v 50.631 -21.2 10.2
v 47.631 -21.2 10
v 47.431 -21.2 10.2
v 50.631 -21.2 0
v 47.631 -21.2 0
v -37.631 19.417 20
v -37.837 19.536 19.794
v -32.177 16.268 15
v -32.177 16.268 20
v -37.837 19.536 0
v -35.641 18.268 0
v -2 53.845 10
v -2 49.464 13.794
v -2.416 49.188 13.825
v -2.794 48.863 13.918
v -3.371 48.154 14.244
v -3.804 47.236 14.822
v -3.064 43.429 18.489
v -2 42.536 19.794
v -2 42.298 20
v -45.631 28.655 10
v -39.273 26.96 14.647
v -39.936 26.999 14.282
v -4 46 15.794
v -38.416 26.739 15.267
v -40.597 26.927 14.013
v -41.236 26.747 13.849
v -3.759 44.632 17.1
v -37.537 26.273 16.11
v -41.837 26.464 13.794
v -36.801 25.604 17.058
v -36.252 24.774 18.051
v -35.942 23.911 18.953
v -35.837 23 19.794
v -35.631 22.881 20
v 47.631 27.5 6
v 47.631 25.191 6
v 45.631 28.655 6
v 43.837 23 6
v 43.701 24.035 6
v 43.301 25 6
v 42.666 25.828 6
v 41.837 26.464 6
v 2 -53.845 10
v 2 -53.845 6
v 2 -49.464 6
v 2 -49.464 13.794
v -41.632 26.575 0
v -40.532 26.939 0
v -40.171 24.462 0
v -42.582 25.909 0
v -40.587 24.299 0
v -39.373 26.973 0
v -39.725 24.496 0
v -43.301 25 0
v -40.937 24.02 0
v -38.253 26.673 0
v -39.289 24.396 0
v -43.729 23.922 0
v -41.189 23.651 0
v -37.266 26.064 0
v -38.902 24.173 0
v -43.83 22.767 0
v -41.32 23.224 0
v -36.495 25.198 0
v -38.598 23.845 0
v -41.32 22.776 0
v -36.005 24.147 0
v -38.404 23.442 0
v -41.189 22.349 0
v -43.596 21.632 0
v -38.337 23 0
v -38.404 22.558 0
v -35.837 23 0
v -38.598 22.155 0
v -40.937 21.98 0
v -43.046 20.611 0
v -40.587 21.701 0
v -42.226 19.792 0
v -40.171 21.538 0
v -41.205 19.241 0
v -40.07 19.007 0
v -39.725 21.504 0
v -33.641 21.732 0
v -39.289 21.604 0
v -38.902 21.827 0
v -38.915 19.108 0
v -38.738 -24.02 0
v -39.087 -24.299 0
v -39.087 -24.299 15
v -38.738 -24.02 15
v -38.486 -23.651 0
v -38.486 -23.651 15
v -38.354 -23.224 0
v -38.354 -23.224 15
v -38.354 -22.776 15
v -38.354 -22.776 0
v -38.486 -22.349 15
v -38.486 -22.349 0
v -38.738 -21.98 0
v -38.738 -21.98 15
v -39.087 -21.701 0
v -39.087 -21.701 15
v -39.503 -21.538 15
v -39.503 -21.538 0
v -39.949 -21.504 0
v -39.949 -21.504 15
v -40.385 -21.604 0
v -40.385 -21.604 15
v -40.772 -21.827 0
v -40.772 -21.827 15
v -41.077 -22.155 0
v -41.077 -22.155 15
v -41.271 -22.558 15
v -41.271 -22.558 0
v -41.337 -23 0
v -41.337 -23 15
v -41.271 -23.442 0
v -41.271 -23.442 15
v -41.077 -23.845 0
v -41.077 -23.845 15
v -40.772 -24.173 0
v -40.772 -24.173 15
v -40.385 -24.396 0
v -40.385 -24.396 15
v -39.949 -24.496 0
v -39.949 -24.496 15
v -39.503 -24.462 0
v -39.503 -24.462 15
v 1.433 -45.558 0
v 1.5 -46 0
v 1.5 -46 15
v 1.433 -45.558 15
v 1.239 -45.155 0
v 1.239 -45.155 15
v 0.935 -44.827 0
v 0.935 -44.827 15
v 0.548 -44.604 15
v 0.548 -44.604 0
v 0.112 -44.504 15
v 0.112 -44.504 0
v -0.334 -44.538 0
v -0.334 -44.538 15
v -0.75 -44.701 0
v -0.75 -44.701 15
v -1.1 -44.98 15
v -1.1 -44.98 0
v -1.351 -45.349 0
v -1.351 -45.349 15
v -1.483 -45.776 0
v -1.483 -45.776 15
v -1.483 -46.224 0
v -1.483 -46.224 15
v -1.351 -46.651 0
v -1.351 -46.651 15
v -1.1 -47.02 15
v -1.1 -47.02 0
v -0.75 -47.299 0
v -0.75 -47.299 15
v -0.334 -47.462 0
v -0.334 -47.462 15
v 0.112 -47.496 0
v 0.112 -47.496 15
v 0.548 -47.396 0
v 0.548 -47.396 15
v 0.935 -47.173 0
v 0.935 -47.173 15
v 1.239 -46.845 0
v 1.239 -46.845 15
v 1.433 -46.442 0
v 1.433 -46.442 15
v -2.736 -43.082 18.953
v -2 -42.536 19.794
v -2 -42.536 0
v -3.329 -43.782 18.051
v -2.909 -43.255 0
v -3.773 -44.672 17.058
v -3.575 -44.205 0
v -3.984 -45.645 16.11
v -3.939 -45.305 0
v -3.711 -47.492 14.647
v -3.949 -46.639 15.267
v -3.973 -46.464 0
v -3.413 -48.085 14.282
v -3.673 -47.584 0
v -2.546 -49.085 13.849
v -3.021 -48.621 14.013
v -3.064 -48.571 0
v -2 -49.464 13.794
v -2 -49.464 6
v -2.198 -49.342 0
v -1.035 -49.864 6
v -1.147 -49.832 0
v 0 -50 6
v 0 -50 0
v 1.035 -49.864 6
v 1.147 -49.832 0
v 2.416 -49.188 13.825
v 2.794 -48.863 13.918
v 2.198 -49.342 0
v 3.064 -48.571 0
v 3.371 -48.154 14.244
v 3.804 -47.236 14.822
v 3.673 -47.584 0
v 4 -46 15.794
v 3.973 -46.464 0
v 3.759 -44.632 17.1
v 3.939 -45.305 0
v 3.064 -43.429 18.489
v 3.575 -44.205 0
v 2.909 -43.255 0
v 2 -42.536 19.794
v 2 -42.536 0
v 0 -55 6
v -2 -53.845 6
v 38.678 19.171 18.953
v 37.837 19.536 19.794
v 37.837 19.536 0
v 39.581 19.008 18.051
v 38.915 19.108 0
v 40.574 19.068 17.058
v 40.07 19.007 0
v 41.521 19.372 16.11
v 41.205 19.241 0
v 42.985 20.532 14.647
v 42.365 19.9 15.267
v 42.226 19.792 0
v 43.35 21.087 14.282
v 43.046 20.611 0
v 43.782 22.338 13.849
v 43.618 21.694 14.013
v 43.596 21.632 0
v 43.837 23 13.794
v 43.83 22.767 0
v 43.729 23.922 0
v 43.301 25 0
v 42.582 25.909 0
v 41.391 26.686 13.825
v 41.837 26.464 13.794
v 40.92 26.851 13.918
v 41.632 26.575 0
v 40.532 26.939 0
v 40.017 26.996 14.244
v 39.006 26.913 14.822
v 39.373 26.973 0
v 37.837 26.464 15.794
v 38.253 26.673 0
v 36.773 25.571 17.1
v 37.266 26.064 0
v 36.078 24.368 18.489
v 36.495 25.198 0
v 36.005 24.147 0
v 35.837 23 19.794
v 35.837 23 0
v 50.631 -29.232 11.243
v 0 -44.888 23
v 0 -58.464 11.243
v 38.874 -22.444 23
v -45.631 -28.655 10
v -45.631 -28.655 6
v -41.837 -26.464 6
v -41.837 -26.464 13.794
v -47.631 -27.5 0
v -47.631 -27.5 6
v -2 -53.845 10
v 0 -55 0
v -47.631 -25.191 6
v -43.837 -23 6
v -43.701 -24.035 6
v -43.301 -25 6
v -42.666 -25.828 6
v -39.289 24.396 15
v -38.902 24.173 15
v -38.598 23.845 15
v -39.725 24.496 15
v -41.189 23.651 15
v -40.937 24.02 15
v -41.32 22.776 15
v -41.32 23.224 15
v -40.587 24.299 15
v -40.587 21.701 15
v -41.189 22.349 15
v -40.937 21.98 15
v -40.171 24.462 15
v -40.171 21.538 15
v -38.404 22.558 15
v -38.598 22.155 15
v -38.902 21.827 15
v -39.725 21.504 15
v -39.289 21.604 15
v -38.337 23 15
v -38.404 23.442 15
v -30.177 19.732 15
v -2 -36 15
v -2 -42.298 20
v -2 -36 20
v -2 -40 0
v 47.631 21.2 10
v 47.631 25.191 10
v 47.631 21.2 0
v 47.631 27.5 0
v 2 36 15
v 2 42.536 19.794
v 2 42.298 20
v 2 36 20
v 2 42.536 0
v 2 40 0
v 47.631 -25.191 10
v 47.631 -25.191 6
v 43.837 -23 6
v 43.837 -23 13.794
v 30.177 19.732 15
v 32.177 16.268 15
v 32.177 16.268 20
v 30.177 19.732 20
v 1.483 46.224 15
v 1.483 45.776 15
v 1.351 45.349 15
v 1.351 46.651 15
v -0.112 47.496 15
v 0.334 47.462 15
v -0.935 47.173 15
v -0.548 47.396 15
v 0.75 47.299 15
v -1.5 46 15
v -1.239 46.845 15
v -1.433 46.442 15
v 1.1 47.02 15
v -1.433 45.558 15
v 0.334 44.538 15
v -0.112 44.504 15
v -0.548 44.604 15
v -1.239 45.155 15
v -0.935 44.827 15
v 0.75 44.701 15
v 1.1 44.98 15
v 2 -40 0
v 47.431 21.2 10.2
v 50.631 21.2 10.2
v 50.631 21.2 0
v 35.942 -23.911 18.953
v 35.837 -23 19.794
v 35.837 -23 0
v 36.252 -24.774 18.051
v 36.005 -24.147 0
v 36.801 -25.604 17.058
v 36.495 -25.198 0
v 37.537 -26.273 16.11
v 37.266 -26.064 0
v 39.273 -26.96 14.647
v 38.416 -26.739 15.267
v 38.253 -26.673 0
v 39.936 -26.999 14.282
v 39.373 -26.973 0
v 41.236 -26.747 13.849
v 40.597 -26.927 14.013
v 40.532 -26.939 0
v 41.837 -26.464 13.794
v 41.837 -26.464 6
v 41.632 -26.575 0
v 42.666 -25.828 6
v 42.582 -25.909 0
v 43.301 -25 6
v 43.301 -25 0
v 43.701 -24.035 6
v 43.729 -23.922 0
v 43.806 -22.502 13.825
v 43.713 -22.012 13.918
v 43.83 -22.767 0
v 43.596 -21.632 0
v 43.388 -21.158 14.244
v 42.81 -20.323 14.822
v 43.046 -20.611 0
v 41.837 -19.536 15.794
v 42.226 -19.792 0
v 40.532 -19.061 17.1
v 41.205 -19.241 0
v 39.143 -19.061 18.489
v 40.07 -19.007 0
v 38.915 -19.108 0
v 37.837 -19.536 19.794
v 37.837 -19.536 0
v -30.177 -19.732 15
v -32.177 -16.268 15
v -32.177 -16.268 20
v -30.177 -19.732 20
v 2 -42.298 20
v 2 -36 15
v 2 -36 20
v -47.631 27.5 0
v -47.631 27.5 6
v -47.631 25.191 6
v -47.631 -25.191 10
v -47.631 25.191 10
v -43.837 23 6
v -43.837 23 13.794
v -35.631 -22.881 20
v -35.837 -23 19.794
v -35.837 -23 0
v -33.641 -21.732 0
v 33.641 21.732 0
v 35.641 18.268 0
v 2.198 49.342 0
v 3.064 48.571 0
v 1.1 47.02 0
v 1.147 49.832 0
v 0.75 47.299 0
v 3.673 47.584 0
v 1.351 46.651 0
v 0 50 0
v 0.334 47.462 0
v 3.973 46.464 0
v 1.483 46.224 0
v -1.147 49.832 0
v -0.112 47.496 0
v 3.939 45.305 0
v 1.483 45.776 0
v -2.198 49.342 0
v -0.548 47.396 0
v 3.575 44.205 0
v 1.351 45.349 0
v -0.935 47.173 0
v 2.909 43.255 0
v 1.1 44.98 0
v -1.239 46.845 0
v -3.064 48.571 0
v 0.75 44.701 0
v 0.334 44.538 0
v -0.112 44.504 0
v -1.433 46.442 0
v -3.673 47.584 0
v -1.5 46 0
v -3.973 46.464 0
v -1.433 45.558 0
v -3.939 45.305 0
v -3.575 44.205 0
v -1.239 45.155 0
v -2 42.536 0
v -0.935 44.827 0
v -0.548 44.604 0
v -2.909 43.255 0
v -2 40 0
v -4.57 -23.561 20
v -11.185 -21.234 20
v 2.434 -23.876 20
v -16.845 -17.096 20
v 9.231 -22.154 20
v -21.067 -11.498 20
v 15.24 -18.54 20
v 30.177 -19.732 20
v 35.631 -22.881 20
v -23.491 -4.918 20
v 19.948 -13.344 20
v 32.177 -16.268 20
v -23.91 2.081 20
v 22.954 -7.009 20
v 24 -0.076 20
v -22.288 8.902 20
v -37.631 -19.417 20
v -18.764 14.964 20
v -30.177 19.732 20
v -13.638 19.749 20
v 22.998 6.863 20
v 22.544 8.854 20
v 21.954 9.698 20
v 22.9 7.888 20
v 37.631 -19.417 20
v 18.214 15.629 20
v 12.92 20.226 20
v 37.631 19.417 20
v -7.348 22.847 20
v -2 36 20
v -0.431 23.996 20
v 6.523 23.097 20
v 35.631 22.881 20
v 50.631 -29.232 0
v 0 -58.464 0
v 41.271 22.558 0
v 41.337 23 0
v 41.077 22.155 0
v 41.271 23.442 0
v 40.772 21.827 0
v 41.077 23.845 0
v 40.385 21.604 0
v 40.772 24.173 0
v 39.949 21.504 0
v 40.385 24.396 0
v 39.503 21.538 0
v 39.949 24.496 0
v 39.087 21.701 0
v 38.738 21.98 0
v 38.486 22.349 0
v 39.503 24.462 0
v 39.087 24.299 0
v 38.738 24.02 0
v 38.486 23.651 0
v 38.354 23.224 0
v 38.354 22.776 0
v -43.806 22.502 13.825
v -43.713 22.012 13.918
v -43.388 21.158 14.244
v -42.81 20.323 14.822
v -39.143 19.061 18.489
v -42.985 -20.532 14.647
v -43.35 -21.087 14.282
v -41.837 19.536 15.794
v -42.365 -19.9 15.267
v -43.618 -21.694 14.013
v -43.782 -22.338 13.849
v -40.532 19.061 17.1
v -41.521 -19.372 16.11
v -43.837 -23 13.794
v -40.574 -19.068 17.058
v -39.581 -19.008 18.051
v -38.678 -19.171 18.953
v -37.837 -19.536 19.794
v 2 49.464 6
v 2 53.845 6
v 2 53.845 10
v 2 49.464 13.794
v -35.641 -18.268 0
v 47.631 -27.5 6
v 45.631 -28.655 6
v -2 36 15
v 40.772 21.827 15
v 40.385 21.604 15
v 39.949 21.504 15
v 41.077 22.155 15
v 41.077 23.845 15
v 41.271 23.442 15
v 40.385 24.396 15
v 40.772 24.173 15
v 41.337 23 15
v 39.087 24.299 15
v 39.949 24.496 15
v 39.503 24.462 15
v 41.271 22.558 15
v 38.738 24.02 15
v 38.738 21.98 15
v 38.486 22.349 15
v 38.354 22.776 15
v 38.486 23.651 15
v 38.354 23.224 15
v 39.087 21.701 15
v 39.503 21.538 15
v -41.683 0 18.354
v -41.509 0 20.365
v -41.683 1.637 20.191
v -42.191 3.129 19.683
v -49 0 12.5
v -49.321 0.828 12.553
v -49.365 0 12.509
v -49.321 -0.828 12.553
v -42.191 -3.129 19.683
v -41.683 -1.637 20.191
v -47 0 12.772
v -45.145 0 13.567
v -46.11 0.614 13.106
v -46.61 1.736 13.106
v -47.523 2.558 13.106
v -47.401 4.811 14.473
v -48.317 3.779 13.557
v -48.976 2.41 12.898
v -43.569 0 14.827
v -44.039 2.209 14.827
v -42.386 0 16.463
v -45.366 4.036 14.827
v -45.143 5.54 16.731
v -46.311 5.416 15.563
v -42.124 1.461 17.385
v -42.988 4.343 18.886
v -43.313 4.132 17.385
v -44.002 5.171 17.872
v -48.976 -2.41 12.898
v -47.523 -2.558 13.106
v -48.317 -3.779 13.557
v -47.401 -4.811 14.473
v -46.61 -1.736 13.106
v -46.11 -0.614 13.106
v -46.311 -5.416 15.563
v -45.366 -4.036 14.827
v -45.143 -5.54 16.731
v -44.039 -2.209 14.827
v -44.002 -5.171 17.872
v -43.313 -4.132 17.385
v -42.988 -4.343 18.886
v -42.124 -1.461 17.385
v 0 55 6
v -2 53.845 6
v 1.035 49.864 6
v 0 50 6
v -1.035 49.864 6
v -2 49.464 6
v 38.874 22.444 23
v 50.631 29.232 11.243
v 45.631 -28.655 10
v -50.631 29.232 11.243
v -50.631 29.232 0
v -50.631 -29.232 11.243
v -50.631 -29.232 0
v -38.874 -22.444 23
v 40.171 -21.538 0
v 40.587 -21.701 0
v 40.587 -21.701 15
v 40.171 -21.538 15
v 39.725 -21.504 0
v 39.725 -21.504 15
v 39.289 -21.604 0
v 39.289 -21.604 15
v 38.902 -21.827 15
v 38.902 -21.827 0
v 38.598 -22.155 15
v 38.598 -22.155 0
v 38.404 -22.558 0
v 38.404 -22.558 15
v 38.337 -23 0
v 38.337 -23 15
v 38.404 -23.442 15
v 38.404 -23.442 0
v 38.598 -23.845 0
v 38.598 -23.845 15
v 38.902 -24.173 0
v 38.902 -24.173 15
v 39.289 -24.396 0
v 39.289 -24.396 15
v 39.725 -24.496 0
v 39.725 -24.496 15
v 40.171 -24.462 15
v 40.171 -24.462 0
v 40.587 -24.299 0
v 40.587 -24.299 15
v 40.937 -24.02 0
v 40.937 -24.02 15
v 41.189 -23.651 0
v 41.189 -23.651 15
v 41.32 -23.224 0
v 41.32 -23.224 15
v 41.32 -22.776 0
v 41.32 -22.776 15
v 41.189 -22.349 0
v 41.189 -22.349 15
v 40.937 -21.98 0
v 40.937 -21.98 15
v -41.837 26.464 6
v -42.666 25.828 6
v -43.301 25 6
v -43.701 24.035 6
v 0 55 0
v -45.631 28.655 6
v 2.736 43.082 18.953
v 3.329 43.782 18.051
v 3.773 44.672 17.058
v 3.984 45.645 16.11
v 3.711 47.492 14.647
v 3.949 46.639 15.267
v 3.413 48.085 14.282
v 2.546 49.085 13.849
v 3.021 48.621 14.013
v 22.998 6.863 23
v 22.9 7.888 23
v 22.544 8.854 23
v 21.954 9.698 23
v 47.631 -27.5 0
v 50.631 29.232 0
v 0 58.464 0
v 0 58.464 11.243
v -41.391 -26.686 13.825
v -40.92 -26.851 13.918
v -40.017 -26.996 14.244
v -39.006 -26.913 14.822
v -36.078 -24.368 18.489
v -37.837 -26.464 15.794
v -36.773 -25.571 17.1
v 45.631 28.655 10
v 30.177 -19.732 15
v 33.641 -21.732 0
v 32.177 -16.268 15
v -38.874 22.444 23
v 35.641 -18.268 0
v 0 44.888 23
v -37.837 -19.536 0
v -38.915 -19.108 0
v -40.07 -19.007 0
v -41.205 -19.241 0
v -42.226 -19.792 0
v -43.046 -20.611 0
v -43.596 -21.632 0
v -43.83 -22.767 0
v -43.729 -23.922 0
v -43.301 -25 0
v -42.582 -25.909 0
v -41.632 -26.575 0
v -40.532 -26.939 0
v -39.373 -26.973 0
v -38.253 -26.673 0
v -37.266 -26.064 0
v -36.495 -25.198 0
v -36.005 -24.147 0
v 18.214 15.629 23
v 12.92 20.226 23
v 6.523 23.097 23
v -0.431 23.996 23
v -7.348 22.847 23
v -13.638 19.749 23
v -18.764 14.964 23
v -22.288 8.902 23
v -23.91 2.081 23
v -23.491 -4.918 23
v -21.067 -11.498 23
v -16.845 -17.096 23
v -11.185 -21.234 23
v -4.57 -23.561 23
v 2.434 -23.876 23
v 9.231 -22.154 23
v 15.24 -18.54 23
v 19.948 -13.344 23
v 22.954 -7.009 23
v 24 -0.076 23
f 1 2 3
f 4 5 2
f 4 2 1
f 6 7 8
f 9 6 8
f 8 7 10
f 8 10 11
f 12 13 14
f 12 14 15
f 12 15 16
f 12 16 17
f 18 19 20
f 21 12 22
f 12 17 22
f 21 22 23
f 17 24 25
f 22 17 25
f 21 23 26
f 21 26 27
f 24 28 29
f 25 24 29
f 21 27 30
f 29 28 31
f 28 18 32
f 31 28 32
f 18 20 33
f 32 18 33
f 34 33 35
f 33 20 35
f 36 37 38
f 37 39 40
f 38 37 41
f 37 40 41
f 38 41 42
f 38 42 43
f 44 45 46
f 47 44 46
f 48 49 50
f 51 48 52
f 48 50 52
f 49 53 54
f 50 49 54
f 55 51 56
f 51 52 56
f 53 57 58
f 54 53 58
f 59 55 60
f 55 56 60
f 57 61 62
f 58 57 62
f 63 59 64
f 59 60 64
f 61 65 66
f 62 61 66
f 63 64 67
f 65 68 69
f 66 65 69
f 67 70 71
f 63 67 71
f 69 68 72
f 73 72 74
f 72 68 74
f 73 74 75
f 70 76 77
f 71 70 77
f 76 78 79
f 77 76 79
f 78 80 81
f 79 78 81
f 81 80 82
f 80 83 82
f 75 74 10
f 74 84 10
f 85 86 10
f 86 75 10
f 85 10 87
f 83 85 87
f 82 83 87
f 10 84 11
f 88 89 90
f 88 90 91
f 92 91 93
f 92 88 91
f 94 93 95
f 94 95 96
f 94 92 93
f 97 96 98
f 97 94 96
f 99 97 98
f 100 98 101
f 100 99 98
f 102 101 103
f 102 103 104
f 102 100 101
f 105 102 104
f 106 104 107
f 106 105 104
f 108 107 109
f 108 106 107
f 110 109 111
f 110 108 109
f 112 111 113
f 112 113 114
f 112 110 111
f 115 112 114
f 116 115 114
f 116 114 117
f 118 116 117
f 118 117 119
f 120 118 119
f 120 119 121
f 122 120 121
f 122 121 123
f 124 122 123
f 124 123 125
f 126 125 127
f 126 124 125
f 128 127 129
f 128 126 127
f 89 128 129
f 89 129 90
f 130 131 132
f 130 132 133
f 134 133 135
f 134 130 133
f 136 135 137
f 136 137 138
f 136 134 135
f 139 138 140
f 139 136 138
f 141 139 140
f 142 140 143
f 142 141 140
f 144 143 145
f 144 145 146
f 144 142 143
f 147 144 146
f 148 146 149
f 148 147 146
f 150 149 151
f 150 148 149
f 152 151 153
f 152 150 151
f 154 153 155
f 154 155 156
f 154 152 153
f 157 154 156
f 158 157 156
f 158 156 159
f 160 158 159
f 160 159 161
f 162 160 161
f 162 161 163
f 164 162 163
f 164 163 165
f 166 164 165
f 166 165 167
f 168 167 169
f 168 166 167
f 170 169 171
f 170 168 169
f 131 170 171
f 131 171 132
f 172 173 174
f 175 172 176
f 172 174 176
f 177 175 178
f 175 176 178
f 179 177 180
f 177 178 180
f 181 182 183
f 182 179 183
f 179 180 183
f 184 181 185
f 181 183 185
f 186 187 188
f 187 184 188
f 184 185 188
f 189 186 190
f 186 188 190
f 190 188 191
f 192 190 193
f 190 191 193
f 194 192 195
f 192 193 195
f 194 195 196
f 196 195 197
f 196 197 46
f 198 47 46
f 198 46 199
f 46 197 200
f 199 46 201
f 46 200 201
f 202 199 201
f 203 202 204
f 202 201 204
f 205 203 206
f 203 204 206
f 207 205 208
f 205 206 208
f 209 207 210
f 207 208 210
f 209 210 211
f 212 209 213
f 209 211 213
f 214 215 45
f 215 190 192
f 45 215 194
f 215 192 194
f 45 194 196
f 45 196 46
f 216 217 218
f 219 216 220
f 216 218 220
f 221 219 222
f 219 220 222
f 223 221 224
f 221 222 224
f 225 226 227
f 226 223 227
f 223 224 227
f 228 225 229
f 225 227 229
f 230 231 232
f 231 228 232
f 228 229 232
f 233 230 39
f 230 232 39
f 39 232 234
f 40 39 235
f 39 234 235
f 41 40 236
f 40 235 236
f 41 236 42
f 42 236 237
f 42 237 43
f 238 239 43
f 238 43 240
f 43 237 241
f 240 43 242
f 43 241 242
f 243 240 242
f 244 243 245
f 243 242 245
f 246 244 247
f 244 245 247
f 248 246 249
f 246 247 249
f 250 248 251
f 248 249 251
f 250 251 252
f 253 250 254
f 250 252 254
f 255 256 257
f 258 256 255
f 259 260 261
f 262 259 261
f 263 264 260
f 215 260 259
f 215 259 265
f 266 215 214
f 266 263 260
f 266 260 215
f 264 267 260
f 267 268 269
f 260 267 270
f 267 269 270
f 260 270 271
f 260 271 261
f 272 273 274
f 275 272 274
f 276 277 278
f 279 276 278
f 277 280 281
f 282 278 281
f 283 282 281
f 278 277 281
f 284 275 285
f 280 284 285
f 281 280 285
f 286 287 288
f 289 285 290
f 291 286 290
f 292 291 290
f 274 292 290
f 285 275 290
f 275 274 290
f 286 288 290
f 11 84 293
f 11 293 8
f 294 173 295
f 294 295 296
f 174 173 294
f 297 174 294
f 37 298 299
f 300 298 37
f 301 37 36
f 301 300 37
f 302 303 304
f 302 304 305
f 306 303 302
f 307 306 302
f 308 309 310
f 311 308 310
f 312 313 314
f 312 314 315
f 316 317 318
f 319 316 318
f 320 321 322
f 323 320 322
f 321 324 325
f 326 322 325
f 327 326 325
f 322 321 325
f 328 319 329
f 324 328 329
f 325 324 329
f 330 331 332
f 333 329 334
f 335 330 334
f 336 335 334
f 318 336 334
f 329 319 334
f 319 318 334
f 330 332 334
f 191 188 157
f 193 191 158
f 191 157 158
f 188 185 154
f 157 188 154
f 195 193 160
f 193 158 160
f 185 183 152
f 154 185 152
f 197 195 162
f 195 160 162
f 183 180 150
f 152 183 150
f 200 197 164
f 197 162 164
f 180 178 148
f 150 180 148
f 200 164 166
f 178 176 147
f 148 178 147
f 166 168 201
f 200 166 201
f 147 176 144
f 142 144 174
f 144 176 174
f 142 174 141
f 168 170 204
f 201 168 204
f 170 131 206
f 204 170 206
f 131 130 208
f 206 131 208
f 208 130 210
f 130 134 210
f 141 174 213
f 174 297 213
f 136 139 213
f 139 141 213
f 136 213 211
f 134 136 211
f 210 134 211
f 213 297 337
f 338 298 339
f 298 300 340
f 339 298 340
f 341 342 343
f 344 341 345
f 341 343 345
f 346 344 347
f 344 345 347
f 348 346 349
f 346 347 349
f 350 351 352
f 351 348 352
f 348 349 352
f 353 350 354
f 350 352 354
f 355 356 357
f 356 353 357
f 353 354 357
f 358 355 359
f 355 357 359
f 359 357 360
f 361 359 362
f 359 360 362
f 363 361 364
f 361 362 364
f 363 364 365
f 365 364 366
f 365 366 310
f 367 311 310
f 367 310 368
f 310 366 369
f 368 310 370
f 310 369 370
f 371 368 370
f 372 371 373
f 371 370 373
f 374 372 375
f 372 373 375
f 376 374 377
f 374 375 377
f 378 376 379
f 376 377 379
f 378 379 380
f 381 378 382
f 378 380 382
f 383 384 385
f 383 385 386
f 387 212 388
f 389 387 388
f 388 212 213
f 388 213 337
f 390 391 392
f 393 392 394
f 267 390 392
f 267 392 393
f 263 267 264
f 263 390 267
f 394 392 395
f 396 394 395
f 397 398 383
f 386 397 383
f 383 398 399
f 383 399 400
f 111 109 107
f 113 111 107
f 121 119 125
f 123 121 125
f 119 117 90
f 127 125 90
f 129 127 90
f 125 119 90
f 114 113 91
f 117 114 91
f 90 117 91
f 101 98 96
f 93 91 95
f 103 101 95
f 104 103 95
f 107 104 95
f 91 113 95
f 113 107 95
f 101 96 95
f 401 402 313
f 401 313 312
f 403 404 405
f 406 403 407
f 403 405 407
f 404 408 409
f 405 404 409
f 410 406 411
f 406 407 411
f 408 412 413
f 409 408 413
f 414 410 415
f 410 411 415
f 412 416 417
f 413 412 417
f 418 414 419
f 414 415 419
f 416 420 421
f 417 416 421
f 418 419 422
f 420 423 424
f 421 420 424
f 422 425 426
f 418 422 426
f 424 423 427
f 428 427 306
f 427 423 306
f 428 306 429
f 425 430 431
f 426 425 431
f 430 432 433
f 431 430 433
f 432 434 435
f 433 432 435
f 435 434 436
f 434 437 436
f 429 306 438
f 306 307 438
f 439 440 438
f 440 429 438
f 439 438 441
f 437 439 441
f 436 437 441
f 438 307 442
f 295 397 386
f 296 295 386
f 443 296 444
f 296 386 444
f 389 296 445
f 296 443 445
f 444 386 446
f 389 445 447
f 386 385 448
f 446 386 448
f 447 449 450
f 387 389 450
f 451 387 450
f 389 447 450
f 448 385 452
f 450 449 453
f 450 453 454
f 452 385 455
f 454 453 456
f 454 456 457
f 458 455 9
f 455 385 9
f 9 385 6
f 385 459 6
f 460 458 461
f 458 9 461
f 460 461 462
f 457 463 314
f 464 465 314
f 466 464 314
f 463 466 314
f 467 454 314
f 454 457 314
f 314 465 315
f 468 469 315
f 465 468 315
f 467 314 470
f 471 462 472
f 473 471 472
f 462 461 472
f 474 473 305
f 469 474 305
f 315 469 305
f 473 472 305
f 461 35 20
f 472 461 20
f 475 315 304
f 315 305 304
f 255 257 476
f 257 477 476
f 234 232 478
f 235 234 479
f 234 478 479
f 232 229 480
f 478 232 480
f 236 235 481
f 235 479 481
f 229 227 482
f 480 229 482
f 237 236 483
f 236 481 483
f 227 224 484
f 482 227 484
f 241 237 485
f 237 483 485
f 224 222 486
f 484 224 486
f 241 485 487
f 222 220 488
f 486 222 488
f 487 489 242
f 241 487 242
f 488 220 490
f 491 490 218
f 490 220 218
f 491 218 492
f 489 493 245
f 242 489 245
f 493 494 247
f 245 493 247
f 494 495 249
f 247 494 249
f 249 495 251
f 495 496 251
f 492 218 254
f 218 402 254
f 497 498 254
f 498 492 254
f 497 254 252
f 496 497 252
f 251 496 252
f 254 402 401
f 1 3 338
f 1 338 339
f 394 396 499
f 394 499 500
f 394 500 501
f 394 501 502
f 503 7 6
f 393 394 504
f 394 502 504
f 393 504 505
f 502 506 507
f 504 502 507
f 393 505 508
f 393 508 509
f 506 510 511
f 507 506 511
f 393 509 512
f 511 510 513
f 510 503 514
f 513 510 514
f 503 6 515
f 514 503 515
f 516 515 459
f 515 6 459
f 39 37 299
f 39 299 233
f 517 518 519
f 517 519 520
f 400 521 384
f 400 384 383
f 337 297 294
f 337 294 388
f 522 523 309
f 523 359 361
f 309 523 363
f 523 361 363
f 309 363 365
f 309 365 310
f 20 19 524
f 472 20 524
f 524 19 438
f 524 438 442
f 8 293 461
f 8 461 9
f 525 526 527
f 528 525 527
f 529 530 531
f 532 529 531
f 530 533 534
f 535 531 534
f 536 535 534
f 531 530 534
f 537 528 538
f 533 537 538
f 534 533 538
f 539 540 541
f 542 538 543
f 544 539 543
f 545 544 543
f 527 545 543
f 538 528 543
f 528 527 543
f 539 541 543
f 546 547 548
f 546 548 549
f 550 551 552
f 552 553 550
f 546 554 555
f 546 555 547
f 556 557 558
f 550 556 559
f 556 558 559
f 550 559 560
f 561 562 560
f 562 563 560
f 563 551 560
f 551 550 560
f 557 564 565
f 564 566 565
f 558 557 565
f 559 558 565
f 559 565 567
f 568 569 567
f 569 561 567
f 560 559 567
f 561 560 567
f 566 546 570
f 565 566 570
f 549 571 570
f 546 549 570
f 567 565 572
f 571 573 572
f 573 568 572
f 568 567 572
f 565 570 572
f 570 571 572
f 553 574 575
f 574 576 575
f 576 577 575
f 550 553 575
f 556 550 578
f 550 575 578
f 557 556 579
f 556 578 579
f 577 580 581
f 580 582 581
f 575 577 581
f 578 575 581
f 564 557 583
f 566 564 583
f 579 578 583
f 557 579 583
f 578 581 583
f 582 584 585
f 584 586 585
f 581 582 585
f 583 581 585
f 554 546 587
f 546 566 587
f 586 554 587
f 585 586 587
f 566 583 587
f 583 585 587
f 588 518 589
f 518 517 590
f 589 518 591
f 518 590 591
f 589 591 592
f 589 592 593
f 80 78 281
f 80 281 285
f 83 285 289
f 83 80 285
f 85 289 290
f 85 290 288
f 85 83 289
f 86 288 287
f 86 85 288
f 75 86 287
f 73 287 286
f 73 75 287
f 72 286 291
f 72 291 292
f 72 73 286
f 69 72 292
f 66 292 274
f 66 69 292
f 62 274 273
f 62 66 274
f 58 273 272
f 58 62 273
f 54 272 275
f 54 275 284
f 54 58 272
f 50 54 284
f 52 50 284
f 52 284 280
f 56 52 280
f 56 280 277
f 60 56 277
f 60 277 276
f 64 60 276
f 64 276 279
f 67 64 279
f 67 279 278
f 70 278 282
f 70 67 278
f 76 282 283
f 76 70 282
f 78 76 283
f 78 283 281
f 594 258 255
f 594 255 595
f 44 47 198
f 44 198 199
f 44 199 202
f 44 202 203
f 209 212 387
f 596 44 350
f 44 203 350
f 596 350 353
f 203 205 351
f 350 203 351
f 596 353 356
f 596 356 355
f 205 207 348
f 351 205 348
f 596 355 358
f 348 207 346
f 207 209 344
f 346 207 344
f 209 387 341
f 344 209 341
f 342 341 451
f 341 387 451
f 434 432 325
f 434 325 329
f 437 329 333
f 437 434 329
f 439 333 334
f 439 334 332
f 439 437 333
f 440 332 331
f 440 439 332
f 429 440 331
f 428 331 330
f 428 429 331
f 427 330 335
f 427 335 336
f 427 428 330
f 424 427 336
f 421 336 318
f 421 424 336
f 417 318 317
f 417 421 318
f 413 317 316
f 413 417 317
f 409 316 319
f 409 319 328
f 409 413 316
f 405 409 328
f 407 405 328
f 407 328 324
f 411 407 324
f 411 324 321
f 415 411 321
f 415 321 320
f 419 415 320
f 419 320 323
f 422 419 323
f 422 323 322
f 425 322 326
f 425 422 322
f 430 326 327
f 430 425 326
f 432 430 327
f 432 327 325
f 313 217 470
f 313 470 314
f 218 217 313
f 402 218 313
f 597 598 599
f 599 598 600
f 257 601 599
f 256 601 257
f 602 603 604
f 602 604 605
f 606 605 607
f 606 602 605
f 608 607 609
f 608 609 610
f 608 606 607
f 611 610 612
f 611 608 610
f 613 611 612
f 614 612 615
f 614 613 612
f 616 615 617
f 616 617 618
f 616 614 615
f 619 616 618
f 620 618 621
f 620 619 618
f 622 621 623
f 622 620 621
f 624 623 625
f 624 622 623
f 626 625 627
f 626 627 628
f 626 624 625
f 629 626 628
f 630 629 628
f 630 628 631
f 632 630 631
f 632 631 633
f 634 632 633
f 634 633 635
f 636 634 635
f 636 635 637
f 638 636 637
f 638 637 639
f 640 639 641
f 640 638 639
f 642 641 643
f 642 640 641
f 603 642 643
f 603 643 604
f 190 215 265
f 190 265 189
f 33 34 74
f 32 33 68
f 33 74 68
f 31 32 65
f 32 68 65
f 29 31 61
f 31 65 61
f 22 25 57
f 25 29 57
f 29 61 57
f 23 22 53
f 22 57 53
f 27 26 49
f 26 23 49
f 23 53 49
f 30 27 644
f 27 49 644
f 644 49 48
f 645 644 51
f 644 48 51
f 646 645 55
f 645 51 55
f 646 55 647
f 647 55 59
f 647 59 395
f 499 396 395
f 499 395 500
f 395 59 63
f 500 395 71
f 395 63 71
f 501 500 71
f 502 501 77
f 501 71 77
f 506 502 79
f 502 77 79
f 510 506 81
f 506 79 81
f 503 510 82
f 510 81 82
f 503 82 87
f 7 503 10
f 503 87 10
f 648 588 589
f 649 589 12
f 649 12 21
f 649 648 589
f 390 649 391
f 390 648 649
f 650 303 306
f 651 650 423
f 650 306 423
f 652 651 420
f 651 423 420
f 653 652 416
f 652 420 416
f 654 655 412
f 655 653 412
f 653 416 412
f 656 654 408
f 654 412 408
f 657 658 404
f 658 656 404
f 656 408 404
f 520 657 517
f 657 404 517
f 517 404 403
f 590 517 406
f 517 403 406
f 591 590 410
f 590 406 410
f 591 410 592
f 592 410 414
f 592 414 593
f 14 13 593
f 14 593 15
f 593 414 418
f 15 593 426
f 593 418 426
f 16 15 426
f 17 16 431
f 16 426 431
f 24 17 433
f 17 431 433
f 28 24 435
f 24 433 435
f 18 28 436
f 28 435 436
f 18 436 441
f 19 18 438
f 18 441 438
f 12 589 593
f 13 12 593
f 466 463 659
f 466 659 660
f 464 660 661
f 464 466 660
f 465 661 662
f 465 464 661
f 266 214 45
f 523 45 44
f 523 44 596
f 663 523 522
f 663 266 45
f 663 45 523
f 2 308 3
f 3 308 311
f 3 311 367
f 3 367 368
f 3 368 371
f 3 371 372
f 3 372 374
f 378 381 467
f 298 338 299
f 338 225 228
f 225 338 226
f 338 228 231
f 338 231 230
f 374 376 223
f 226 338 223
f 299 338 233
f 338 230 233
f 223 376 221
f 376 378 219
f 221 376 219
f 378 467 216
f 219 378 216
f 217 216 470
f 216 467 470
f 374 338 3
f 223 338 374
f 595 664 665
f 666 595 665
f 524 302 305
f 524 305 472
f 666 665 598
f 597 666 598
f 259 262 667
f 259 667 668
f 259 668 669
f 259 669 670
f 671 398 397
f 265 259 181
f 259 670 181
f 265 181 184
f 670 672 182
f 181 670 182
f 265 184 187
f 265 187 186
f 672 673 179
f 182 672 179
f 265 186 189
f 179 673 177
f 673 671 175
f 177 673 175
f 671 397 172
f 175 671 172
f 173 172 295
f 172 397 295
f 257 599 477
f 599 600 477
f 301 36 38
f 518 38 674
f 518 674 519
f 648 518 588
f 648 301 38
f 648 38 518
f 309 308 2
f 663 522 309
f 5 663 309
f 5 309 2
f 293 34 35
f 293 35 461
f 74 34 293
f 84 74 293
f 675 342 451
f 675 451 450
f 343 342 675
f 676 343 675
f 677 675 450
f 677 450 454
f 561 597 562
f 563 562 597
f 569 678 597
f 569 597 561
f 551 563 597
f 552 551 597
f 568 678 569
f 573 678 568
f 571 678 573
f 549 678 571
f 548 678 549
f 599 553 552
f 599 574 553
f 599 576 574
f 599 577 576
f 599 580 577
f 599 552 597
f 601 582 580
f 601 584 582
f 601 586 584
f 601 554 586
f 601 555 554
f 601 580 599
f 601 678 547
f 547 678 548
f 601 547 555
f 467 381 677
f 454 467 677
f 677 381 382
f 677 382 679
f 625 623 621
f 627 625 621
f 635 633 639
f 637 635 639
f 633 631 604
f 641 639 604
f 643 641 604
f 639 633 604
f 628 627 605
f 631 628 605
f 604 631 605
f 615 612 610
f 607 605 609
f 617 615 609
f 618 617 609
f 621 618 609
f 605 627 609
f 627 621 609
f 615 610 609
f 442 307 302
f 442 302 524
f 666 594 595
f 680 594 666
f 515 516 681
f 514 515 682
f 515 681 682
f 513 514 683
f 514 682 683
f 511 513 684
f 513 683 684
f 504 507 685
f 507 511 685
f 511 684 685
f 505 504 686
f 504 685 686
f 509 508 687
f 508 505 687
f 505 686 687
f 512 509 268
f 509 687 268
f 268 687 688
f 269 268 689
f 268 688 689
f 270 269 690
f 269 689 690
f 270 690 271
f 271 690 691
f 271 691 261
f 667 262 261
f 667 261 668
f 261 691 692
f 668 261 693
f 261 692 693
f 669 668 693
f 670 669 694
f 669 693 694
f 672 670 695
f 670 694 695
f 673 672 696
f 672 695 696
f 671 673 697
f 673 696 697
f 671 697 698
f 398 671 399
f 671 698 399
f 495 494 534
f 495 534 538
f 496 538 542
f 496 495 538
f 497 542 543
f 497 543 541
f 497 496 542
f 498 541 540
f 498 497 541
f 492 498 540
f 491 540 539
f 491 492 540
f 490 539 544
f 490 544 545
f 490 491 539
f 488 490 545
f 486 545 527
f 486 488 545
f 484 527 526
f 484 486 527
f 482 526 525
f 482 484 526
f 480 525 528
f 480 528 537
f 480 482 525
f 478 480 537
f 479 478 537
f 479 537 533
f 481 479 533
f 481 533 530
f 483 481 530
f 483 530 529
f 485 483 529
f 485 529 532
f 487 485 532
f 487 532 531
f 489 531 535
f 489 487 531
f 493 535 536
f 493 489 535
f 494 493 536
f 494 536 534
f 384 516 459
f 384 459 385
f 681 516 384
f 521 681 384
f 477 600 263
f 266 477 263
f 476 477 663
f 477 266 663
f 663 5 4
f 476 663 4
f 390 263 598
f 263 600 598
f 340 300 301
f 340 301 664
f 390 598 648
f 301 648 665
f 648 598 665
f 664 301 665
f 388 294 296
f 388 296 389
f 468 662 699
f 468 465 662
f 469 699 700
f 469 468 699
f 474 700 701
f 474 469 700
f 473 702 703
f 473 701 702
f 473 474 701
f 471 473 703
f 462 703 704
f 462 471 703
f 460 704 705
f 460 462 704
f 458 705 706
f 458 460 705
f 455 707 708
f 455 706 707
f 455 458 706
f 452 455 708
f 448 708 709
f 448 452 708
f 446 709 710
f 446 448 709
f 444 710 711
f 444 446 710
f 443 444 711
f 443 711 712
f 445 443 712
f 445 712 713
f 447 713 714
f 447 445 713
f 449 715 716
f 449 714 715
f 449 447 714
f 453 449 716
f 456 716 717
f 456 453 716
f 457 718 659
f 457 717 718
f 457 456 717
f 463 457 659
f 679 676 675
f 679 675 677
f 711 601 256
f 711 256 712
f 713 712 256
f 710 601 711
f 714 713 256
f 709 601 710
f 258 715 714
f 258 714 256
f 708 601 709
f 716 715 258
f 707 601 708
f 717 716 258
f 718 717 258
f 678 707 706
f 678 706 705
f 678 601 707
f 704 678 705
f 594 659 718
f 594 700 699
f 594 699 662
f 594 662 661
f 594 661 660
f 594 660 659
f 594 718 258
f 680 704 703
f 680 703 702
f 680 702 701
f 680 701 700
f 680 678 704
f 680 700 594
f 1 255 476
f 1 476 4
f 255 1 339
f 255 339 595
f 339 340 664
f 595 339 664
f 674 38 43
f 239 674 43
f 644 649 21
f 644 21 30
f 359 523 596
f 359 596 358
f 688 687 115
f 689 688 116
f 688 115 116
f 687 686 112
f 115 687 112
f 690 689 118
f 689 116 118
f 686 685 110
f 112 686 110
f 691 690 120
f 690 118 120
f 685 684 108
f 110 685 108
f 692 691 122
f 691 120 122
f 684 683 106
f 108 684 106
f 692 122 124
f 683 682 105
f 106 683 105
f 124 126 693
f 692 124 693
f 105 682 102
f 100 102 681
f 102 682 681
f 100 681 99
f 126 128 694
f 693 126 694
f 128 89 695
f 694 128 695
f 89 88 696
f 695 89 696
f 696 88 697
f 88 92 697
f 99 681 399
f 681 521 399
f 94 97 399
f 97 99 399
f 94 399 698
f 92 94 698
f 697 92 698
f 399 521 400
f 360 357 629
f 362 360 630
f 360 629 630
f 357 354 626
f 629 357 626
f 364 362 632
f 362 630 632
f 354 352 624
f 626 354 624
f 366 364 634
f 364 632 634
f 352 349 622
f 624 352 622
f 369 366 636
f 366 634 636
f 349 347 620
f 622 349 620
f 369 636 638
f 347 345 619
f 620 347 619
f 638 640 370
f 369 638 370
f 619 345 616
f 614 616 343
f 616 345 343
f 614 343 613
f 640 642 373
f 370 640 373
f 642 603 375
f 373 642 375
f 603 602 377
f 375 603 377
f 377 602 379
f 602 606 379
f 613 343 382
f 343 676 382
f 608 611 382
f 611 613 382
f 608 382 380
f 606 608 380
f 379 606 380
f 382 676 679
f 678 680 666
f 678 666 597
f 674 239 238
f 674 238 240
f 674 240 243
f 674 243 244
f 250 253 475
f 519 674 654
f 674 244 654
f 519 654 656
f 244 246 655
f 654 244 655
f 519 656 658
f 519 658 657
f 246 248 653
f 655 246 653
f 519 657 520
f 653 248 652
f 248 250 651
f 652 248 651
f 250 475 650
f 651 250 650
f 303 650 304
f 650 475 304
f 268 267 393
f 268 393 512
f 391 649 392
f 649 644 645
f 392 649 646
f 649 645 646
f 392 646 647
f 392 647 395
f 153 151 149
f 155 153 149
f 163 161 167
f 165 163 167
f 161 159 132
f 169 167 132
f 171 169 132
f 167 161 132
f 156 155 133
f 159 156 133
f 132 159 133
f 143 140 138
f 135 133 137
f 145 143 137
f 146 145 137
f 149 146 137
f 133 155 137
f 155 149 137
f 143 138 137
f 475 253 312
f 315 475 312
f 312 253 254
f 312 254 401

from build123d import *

# Parameters (mm, degrees)
BOX038_W                 = 6
BOX038_H                 = 42.4
BOX038_DEPTH             = 10.2
CYLINDER053_R            = 2
CYLINDER053_DEPTH        = 42
CYLINDER053_ROLL_ANGLE   = 90
PAD007_DEPTH             = 37
BODY008_PITCH_ANGLE      = -45
CYLINDER051_R            = 4
CYLINDER051_DEPTH        = 44
CYLINDER052_R            = 24
CYLINDER052_DEPTH        = 44
PAD006_DEPTH             = 5.62
PRISM012_DEPTH           = 20
PRISM012_PLACEMENT_ANGLE = 30
CHAMFER008_SIZE          = 10
THICKNESS001_T           = 3
CYLINDER055_R            = 1.5
CYLINDER055_DEPTH        = 15
BOX040_W                 = 4
BOX040_H                 = 7
BOX040_DEPTH             = 22
CHAMFER009_SIZE2         = 4
CHAMFER009_SIZE          = 15
BOX039_W                 = 12
BOX039_H                 = 10
BOX039_DEPTH             = 14
BOX039_ROLL_ANGLE        = -45
CYLINDER054_R            = 4
CYLINDER054_DEPTH        = 21
BOX041_W                 = 4
BOX041_H                 = 7
BOX041_DEPTH             = 10
CHAMFER010_SIZE          = 5
ARRAY003_COUNT           = 6


with BuildPart() as esfera:
    # Sphere → Sphere (revolve)
    with BuildSketch(Plane(origin=(-49, 0, 20), x_dir=(1, 0, 0), z_dir=(0, -1, 0))):
        with BuildLine():
            ThreePointArc((0, -7.5), (7.5, 0), (0, 7.5))
            Line((0, 7.5), (0, -7.5))
        make_face()
    revolve(axis=Axis((-49, 0, 20), (0, 0, 1)))


with BuildPart() as cubo034:
    # Box038 → Box038 (new body)
    with BuildSketch(Plane(origin=(44.7, -21.2, 0), x_dir=(1, 0, 0), z_dir=(0, 0, 1))):
        with Locations((3, 21.2)):
            Rectangle(BOX038_W, BOX038_H)
    extrude(amount=BOX038_DEPTH)


with BuildPart() as cylinder053:
    # Cylinder053 → Cylinder053 (new body)
    with BuildSketch(Plane.XY):
        Circle(CYLINDER053_R)
    extrude(amount=CYLINDER053_DEPTH)


with BuildPart() as cylinder053_1:
    # Cylinder053 roll: moved
    add(cylinder053.part.rotate(Axis((0, 0, 0), (1, 0, 0)), CYLINDER053_ROLL_ANGLE))


with BuildPart() as cylinder053_2:
    # Cylinder053 placement: moved
    add(cylinder053_1.part.moved(Location((-39, 21, 33))))


with BuildPart() as body008:
    # Sketch008 → Pad007 (new body)
    with BuildSketch(Plane.XY):
        Polygon((-40.876069, 10), (-49.536323, 5), (-49.536323, -5), (-40.876069, -10), (-32.215815, -5), (-32.215815, 5), align=None)
    extrude(amount=PAD007_DEPTH)


with BuildPart() as body008_1:
    # Body008 pitch: moved
    add(body008.part.rotate(Axis((0, 0, 0), (0, 1, 0)), BODY008_PITCH_ANGLE))


with BuildPart() as body008_2:
    # Body008 placement: moved
    add(body008_1.part.moved(Location((0, 0, 103))))


with BuildPart() as agujero_led_builtin001:
    # Cylinder051 → Cylinder051 (new body)
    with BuildSketch(Plane(origin=(19, 7, 0), x_dir=(1, 0, 0), z_dir=(0, 0, 1))):
        Circle(CYLINDER051_R)
    extrude(amount=CYLINDER051_DEPTH)


with BuildPart() as fusion019:
    # Cylinder052 → Cylinder052 (new body)
    with BuildSketch(Plane.XY):
        Circle(CYLINDER052_R)
    extrude(amount=CYLINDER052_DEPTH)

    # Fusion019: union agujero led builtin001
    add(agujero_led_builtin001.part)


with BuildPart() as agujero_microusb002:
    # Sketch007 → Pad006 (new body)
    with BuildSketch(Plane.YZ):
        Polygon((-3, 0.536587), (3, 0.536587), (4.5, -3.263413), (-4.5, -3.263413), align=None)
    extrude(amount=PAD006_DEPTH)


with BuildPart() as agujero_microusb002_1:
    # Body007 placement: moved
    add(agujero_microusb002.part.moved(Location((45.85, 0, 5))))


with BuildPart() as superior001:
    # Prism012 → Prism012 (new body)
    with BuildSketch(Plane.XY):
        Polygon((55, 0), (27.5, 47.631397), (-27.5, 47.631397), (-55, 0), (-27.5, -47.631397), (27.5, -47.631397), align=None)
    extrude(amount=PRISM012_DEPTH)


with BuildPart() as superior001_1:
    # Prism012 placement: moved
    add(superior001.part.rotate(Axis((0, 0, 0), (0, 0, 1)), PRISM012_PLACEMENT_ANGLE))

    # Chamfer008
    chamfer008_edges = [superior001_1.edges().sort_by_distance(p)[0] for p in [
        (23.815699, 41.25, 20),
        (-23.815699, 41.25, 20),
        (-47.631397, 0, 20),
        (-23.815699, -41.25, 20),
        (23.815699, -41.25, 20),
        (47.631397, 0, 20),
    ]]
    chamfer(chamfer008_edges, length=CHAMFER008_SIZE)

    # Thickness001
    thickness001_openings = [superior001_1.faces().sort_by_distance(p)[0] for p in [
        (0, 0, 0),
    ]]
    offset(amount=THICKNESS001_T, openings=thickness001_openings, kind=Kind.INTERSECTION)

    # Cut022: cut agujero microusb002
    add(agujero_microusb002_1.part, mode=Mode.SUBTRACT)

    # Cut023: cut Fusion019
    add(fusion019.part, mode=Mode.SUBTRACT)

    # Cut024: cut Body008
    add(body008_2.part, mode=Mode.SUBTRACT)

    # Cut025: cut Cylinder053
    add(cylinder053_2.part, mode=Mode.SUBTRACT)

    # Cut026: cut Cubo034
    add(cubo034.part, mode=Mode.SUBTRACT)


with BuildPart() as cilindro028:
    # Cylinder055 → Cylinder055 (new body)
    with BuildSketch(Plane(origin=(0, -46, 0), x_dir=(1, 0, 0), z_dir=(0, 0, 1))):
        Circle(CYLINDER055_R)
    extrude(amount=CYLINDER055_DEPTH)


with BuildPart() as chamfer009:
    # Box040 → Box040 (new body)
    with BuildSketch(Plane(origin=(-2, -43, 0), x_dir=(1, 0, 0), z_dir=(0, 0, 1))):
        with Locations((2, 3.5)):
            Rectangle(BOX040_W, BOX040_H)
    extrude(amount=BOX040_DEPTH)

    # Chamfer009
    chamfer009_edges = [chamfer009.edges().sort_by_distance(p)[0] for p in [
        (0, -36, 0),
    ]]
    chamfer009_side = chamfer009.faces().sort_by_distance((0, -36, 11))[0]
    chamfer(chamfer009_edges, length=CHAMFER009_SIZE, length2=CHAMFER009_SIZE2, reference=chamfer009_side)


with BuildPart() as cubo035:
    # Box039 → Box039 (new body)
    with BuildSketch(Plane.XY):
        with Locations((6, 5)):
            Rectangle(BOX039_W, BOX039_H)
    extrude(amount=BOX039_DEPTH)


with BuildPart() as cubo035_1:
    # Box039 roll: moved
    add(cubo035.part.rotate(Axis((0, 0, 0), (1, 0, 0)), BOX039_ROLL_ANGLE))


with BuildPart() as cubo035_2:
    # Box039 placement: moved
    add(cubo035_1.part.moved(Location((-7, -59, 20))))


with BuildPart() as cut027:
    # Cylinder054 → Cylinder054 (new body)
    with BuildSketch(Plane(origin=(0, -46, 0), x_dir=(1, 0, 0), z_dir=(0, 0, 1))):
        Circle(CYLINDER054_R)
    extrude(amount=CYLINDER054_DEPTH)

    # Cut027: cut Cubo035
    add(cubo035_2.part, mode=Mode.SUBTRACT)


with BuildPart() as superior_final:
    # Box041 → Box041 (new body)
    with BuildSketch(Plane(origin=(-2, -56, 6), x_dir=(1, 0, 0), z_dir=(0, 0, 1))):
        with Locations((2, 3.5)):
            Rectangle(BOX041_W, BOX041_H)
    extrude(amount=BOX041_DEPTH)

    # Chamfer010
    chamfer010_edges = [superior_final.edges().sort_by_distance(p)[0] for p in [
        (0, -56, 16),
    ]]
    chamfer(chamfer010_edges, length=CHAMFER010_SIZE)

    # Fusion020: union Chamfer009, Cut027
    add(chamfer009.part)
    add(cut027.part)

    # Cut028: cut Cilindro028
    add(cilindro028.part, mode=Mode.SUBTRACT)

    # Array003: superior final ×6 about axis
    array003_axis = Axis((0, 0, 0), (0, 0, 1))


with BuildPart() as superior_final_1:
    add(superior_final.part)
    for i in range(1, ARRAY003_COUNT):
        add(superior_final.part.rotate(array003_axis, i * 360 / ARRAY003_COUNT))

    # Fusion021: union superior001
    add(superior001_1.part)

    # Cut029: cut Esfera
    add(esfera.part, mode=Mode.SUBTRACT)


solid = superior_final_1.part
